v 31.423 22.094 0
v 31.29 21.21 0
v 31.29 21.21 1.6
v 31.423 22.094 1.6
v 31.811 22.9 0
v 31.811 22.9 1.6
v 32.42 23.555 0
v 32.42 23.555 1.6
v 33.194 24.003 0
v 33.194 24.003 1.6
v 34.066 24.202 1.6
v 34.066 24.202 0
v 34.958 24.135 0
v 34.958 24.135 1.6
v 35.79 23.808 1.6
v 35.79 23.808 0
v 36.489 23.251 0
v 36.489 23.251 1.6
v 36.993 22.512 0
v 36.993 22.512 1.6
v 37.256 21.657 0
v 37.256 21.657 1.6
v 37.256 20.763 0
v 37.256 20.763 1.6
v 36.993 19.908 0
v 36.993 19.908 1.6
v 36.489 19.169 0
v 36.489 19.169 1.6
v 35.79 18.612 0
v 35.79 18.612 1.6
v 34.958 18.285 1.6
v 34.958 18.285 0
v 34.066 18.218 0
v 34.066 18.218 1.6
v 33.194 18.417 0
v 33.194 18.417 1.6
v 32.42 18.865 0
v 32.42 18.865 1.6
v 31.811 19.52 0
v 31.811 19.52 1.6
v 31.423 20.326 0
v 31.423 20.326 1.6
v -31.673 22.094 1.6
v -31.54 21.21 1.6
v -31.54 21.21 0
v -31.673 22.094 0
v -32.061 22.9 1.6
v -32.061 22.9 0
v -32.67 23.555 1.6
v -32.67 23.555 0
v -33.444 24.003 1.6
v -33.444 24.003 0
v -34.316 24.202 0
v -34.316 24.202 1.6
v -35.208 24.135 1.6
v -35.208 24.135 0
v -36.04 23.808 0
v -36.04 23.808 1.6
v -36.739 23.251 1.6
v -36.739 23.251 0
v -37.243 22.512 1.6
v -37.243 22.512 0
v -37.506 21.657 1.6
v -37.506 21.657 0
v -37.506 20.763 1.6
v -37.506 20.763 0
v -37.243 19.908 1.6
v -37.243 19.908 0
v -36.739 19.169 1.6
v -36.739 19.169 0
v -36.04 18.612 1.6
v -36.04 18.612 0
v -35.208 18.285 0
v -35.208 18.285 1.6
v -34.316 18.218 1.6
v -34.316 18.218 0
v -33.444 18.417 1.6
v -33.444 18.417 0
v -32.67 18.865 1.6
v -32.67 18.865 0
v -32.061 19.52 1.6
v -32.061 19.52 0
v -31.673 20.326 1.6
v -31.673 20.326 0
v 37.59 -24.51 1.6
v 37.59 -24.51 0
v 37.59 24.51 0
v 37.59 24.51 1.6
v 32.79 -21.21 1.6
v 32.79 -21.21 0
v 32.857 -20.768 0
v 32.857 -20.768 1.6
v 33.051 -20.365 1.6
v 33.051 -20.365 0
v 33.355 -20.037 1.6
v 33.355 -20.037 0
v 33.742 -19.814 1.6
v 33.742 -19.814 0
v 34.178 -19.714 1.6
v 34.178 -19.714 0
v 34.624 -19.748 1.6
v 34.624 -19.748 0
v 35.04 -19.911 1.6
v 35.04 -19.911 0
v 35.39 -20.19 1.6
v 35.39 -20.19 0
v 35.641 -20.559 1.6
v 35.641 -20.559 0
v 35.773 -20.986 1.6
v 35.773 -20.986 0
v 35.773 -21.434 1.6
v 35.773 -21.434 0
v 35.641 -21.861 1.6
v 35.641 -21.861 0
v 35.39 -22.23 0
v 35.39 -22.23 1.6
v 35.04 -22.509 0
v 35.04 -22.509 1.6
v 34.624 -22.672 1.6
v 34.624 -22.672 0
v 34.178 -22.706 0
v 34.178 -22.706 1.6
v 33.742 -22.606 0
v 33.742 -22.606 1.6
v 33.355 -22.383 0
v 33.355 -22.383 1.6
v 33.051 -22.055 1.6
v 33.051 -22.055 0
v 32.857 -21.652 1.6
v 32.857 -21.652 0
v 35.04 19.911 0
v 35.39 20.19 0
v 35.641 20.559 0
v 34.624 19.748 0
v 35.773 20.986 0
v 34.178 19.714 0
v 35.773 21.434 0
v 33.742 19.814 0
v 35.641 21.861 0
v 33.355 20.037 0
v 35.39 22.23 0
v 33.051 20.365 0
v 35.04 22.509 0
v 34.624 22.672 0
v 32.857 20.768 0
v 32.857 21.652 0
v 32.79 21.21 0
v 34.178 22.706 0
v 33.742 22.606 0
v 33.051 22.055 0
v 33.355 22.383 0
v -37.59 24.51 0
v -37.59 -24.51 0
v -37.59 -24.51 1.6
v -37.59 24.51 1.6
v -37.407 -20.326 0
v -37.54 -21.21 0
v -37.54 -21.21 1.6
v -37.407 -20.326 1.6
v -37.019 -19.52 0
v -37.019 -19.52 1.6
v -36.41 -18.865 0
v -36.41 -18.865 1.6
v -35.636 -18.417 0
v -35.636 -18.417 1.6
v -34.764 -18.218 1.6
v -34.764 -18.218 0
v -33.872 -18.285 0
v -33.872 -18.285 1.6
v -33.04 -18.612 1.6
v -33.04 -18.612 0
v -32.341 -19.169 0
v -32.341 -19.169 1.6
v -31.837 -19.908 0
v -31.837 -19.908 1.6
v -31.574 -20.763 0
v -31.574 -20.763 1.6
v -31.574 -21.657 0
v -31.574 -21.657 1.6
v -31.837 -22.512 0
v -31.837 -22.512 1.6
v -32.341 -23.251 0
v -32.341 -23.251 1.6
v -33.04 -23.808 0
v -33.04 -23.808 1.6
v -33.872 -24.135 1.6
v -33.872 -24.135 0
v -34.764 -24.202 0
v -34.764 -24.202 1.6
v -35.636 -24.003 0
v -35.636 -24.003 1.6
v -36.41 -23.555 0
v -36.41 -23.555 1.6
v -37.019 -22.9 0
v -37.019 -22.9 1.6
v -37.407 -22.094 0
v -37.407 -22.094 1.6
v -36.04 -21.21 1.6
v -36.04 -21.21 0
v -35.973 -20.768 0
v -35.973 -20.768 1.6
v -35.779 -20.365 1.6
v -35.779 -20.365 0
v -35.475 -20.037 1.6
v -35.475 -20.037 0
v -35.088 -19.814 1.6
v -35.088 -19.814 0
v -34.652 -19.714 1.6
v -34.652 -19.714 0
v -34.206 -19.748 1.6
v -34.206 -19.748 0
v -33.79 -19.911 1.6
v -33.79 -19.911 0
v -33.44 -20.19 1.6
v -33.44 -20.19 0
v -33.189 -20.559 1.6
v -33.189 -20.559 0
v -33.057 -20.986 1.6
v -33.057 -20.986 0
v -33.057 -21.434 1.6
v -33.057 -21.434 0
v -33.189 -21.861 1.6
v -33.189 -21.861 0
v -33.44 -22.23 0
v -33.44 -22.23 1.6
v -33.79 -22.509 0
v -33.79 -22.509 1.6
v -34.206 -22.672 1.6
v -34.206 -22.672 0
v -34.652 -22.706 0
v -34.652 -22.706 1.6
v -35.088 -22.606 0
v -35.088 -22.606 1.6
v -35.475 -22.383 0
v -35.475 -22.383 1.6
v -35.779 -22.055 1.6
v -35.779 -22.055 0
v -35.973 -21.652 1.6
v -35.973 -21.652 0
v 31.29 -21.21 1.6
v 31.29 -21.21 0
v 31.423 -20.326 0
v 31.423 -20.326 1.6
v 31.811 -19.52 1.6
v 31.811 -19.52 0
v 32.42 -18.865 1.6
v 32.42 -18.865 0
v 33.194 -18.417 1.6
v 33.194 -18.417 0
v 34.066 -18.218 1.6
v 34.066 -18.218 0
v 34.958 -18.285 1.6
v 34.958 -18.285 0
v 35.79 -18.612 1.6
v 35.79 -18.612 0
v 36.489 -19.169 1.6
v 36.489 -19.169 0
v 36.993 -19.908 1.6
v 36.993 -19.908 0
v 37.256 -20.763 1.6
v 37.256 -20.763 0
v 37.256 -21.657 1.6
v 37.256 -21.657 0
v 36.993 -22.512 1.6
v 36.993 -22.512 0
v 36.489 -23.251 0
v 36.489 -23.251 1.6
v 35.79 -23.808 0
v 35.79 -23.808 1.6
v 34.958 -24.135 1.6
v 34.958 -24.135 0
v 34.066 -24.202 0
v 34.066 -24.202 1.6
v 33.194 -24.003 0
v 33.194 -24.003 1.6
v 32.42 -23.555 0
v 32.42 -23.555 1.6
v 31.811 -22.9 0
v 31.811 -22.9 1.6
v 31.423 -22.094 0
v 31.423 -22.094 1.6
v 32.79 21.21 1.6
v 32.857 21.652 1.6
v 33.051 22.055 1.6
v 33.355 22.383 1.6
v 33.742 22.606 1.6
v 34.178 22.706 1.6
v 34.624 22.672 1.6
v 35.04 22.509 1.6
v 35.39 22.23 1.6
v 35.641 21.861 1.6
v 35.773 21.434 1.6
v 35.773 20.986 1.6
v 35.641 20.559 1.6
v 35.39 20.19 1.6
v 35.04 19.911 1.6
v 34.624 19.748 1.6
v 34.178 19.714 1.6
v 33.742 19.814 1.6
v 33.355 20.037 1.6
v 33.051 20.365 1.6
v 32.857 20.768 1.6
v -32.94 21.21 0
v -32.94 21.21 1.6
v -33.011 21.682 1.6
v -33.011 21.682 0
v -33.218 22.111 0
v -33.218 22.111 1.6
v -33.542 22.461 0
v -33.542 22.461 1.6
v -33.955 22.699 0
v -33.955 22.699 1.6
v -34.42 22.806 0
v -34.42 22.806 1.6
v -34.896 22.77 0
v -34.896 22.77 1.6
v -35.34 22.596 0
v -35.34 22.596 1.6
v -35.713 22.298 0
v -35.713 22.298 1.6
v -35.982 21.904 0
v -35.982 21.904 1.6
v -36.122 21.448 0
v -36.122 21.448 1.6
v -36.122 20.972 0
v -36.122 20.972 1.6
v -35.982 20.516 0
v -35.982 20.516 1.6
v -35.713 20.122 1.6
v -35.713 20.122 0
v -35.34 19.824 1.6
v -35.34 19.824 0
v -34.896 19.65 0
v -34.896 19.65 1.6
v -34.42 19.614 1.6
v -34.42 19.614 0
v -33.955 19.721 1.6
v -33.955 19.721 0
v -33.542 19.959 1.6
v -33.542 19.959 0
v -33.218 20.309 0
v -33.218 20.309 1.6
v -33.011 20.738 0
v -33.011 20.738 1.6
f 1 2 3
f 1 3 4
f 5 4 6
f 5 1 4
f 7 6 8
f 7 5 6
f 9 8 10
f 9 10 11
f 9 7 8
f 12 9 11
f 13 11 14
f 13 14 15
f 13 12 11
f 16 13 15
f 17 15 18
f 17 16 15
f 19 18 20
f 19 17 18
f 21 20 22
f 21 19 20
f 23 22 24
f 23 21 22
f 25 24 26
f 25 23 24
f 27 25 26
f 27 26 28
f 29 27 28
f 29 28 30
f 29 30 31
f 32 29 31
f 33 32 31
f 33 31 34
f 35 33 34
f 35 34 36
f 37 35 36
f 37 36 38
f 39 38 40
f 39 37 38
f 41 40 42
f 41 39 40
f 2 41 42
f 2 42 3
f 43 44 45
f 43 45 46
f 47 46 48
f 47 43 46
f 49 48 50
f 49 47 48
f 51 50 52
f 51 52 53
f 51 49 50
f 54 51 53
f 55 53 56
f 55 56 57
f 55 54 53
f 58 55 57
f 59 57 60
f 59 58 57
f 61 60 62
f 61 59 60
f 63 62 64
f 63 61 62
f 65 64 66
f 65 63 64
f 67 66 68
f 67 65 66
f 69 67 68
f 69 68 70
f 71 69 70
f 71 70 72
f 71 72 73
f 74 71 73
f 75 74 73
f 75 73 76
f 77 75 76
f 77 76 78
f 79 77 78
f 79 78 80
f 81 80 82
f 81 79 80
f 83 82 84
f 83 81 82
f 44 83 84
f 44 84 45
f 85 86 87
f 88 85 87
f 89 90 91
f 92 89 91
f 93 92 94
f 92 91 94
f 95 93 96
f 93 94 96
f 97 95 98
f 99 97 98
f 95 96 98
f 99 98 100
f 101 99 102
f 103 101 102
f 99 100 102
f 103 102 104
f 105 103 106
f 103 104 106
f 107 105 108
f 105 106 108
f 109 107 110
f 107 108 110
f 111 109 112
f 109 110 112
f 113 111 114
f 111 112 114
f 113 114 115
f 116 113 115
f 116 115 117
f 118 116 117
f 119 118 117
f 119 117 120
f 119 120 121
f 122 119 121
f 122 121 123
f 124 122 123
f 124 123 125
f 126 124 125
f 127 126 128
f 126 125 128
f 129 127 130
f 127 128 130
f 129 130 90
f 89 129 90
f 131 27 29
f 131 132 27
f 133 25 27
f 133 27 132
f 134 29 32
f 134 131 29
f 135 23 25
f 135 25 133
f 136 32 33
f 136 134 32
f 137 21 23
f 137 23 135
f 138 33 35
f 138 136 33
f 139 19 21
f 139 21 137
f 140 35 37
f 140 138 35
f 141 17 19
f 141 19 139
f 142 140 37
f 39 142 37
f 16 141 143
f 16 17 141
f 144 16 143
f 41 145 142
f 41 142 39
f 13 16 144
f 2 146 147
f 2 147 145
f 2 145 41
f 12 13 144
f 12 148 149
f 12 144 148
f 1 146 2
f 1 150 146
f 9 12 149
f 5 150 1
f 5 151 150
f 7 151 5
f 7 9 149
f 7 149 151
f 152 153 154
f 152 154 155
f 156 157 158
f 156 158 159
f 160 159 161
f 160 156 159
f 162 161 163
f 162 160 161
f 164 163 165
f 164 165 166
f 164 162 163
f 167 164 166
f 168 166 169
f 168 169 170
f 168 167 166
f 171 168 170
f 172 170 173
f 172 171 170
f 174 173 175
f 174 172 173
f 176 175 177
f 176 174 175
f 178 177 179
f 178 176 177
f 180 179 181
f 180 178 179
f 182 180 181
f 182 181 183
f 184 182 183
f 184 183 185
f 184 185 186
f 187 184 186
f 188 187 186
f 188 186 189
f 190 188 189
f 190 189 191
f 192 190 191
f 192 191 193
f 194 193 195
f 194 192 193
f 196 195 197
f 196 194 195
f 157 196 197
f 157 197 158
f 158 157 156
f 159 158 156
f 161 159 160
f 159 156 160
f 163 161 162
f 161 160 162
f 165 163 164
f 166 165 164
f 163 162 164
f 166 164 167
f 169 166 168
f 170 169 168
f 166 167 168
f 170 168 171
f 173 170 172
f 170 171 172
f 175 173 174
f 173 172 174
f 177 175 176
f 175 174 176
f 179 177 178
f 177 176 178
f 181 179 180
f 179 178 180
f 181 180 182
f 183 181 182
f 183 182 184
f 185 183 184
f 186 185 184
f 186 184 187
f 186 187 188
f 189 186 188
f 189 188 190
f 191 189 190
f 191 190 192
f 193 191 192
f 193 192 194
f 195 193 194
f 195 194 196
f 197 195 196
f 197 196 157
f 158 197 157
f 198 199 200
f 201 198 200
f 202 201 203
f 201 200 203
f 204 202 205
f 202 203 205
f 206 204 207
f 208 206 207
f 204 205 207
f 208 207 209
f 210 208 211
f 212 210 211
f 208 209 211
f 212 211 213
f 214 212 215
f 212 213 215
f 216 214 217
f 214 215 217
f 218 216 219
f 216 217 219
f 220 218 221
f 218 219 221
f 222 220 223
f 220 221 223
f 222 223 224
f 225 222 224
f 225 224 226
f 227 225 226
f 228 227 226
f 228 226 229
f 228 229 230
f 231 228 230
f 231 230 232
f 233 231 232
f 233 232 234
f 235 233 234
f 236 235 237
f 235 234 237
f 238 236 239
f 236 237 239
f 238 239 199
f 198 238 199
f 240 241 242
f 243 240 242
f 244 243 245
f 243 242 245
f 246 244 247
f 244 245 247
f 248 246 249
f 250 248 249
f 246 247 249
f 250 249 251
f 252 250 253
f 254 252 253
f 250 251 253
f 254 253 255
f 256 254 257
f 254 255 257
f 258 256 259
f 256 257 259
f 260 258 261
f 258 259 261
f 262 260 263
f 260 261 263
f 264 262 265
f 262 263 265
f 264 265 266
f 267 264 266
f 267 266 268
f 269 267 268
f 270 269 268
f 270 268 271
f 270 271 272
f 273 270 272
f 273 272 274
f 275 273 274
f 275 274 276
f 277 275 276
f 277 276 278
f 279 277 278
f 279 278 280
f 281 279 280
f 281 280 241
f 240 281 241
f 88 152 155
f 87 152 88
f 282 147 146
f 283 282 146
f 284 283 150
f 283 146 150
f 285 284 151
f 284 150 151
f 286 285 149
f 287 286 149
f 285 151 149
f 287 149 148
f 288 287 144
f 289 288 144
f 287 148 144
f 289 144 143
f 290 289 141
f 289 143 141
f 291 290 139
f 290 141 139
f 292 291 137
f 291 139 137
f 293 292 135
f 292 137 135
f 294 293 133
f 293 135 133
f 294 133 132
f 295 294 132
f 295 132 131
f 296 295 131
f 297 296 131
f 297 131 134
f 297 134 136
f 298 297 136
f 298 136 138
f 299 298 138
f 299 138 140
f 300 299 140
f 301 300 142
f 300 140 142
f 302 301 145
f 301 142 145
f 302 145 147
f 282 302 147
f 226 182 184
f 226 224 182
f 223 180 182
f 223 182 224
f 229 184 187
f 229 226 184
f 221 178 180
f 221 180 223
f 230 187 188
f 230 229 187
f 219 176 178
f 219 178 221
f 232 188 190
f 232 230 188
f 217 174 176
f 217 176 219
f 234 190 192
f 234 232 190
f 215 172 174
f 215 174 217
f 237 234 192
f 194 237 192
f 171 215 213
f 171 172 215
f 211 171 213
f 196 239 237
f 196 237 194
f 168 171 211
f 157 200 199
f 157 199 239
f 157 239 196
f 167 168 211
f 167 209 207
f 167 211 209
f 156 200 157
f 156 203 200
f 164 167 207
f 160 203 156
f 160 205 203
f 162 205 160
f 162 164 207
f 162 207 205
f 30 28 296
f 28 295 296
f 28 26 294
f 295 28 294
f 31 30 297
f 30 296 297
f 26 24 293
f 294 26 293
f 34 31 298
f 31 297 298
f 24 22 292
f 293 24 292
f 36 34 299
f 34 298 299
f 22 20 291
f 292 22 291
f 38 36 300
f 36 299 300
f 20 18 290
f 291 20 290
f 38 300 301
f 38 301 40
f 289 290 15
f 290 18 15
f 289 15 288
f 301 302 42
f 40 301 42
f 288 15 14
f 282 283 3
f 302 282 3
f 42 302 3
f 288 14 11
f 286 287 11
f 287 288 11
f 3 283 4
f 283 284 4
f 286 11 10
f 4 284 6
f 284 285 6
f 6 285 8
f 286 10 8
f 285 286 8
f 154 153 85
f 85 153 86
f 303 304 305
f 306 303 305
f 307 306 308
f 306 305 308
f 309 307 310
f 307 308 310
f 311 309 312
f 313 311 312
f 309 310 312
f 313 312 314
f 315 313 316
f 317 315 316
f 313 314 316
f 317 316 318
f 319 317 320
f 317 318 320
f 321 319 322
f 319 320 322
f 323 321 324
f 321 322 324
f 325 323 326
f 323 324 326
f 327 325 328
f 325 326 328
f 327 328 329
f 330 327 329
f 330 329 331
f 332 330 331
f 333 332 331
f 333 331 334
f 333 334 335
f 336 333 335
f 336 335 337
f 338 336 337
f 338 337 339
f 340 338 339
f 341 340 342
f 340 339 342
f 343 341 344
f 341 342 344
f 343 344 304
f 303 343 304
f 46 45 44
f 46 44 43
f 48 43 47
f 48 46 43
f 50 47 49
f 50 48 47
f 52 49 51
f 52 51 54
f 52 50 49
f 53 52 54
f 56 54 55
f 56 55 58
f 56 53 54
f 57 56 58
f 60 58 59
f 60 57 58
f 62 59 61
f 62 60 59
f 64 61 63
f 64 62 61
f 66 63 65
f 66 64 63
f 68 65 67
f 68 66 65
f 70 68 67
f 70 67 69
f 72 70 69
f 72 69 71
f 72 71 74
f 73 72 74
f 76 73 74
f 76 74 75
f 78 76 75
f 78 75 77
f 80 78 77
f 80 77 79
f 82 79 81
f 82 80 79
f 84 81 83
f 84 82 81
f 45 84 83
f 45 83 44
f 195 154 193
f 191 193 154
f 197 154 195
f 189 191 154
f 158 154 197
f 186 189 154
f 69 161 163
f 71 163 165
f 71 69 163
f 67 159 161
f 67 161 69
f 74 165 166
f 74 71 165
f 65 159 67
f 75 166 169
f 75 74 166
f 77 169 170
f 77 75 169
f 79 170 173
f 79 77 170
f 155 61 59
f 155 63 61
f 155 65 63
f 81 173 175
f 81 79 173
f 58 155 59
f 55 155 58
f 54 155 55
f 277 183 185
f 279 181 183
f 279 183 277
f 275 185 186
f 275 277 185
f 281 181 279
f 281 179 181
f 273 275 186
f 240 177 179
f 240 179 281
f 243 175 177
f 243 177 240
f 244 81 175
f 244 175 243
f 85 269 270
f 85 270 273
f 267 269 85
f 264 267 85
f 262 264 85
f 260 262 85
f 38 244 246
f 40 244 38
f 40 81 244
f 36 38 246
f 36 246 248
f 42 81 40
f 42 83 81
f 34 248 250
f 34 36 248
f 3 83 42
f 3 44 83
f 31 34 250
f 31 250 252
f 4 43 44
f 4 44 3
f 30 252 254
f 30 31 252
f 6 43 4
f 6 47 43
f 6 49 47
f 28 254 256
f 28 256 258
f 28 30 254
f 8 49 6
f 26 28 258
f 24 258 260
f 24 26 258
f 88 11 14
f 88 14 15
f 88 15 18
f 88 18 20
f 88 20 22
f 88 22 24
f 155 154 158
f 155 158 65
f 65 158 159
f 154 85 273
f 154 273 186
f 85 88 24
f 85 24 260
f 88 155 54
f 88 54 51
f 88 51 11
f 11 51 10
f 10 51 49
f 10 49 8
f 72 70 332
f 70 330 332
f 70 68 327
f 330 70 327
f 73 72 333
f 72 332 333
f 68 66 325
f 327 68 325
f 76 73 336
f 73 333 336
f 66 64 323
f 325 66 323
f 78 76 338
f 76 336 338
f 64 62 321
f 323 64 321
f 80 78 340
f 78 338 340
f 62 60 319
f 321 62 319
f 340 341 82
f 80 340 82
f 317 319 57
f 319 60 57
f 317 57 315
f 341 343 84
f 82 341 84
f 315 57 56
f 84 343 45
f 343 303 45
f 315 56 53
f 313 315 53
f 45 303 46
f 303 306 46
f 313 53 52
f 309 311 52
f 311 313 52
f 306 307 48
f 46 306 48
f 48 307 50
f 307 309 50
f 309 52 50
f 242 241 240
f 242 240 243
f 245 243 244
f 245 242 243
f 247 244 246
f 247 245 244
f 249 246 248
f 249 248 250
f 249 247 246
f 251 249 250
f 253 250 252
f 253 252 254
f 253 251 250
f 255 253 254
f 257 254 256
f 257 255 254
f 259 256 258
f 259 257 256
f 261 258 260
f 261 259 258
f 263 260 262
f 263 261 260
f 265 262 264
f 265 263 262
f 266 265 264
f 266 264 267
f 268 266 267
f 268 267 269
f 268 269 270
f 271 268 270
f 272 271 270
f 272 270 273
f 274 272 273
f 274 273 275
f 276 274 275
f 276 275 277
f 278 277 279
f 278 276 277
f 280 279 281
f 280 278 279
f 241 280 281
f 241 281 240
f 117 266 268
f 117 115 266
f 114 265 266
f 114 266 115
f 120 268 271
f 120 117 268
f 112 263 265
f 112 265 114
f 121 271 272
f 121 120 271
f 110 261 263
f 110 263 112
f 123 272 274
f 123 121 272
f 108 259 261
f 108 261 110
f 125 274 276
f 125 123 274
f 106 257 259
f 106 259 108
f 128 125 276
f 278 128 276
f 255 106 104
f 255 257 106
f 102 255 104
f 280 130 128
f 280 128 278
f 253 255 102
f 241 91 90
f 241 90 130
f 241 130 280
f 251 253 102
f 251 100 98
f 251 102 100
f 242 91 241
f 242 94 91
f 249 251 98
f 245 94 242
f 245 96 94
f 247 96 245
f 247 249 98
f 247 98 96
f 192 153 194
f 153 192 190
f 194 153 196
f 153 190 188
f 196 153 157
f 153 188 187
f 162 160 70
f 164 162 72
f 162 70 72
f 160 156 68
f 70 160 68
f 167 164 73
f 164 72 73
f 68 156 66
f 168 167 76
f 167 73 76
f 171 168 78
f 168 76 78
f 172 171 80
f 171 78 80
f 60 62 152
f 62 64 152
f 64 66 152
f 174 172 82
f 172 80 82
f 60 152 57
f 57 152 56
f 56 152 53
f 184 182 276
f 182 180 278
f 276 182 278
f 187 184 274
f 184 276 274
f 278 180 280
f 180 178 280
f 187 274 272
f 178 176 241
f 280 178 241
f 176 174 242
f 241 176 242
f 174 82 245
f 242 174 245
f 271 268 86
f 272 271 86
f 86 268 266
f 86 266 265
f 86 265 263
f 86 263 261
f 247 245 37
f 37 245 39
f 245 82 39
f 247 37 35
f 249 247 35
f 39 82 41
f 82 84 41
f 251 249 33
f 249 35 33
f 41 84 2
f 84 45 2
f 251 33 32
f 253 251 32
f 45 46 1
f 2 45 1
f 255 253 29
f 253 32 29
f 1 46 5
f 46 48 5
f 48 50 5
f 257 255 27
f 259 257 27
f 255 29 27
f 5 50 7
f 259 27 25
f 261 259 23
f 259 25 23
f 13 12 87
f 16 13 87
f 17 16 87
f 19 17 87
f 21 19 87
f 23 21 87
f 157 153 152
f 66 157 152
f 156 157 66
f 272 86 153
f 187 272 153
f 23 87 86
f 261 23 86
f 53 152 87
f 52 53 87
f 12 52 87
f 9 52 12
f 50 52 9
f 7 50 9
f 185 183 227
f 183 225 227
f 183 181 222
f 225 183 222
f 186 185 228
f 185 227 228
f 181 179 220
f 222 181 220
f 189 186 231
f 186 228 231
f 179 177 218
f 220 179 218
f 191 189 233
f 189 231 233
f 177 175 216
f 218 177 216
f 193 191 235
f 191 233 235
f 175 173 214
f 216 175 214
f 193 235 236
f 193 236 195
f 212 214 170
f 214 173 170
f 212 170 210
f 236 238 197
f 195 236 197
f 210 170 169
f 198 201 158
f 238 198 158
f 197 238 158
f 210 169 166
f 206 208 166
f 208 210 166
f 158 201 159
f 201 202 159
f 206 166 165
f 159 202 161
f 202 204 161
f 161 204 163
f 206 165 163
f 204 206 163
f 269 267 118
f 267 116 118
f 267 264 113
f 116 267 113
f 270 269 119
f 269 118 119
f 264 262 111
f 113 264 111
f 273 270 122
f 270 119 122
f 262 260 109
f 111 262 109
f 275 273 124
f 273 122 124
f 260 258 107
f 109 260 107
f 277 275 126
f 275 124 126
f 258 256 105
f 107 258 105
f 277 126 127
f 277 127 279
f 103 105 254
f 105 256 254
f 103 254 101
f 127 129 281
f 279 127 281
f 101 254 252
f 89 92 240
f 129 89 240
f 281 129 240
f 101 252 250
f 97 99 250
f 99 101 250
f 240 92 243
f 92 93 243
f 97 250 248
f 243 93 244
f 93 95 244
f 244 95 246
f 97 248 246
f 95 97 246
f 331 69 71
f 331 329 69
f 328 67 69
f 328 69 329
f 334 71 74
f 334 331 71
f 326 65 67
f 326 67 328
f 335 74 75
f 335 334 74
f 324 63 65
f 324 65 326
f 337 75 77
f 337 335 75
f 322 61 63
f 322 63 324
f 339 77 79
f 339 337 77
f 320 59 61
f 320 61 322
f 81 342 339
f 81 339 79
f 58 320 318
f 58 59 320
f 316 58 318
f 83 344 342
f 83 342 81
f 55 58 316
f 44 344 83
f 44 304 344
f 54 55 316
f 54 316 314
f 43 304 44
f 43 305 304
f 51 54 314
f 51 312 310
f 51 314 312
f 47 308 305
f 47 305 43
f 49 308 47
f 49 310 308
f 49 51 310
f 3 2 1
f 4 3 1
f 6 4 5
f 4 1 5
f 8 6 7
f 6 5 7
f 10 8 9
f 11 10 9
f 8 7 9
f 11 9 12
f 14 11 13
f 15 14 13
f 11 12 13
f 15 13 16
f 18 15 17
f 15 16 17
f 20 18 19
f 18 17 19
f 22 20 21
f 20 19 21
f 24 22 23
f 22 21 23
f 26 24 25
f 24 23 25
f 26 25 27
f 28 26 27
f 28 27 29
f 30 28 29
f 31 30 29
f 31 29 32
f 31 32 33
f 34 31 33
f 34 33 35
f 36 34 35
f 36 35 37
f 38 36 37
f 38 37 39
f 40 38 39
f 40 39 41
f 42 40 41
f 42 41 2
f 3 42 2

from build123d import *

# Parameters (mm, degrees)
CUT_EXTRUDE1_START       = -1.6002
CUT_EXTRUDE1_OUTLINE_W   = 75.18
CUT_EXTRUDE1_OUTLINE_H   = 49.02
CUT_EXTRUDE1_OUTLINE_R   = 1.6
CUT_EXTRUDE1_OUTLINE_R_2 = 3
CUT_EXTRUDE1_DEPTH       = 1.6002
SKETCH3_R                = 3
SKETCH3_R_2              = 1.6
BOSS_EXTRUDE2_DEPTH      = 1.6002
SKETCH4_R                = 3
CUT_EXTRUDE2_DEPTH       = 45.903327717
SKETCH7_R                = 3
SKETCH7_R_2              = 1.5
BOSS_EXTRUDE4_DEPTH      = 1.6002
SKETCH8_R                = 3
SKETCH8_R_2              = 1.5
BOSS_EXTRUDE5_DEPTH      = 1.6002
SKETCH9_R                = 3
SKETCH9_R_2              = 1.5
BOSS_EXTRUDE6_DEPTH      = 1.6002


with BuildPart() as part:
    # Cut-Extrude1: read off the stored shape, not the designer's step
    # Cut-Extrude1 outline → Cut-Extrude1 (new body)
    with BuildSketch(Plane.XY.offset(1.6002).offset(CUT_EXTRUDE1_START)):
        Rectangle(CUT_EXTRUDE1_OUTLINE_W, CUT_EXTRUDE1_OUTLINE_H)
        with Locations((-34.54, -21.21)):
            Circle(CUT_EXTRUDE1_OUTLINE_R, mode=Mode.SUBTRACT)
        with Locations((34.29, -21.21)):
            Circle(CUT_EXTRUDE1_OUTLINE_R, mode=Mode.SUBTRACT)
        with Locations((-34.54, 21.21)):
            Circle(CUT_EXTRUDE1_OUTLINE_R_2, mode=Mode.SUBTRACT)
        with Locations((34.29, 21.21)):
            Circle(CUT_EXTRUDE1_OUTLINE_R, mode=Mode.SUBTRACT)
    extrude(amount=CUT_EXTRUDE1_DEPTH)

    # Sketch4 → Cut-Extrude2 (cut, through all)
    with BuildSketch(Plane(origin=(0, 0, 0), x_dir=(-1, 0, 0), z_dir=(0, 0, -1))):
        with Locations((34.54, -21.21)):
            Circle(SKETCH4_R)
        with Locations((-34.29, -21.21)):
            Circle(SKETCH4_R)
        with Locations((-34.29, 21.21)):
            Circle(SKETCH4_R)
    extrude(amount=-CUT_EXTRUDE2_DEPTH, mode=Mode.SUBTRACT)


with BuildPart() as body_2:
    # Sketch3 → Boss-Extrude2 (new body)
    with BuildSketch(Plane.XY.offset(1.6002)):
        with Locations((-34.54, 21.21)):
            Circle(SKETCH3_R)
        with Locations((-34.54, 21.21)):
            Circle(SKETCH3_R_2, mode=Mode.SUBTRACT)
    extrude(amount=-BOSS_EXTRUDE2_DEPTH)


with BuildPart() as body_3:
    # Sketch7 → Boss-Extrude4 (new body)
    with BuildSketch(Plane(origin=(0, 0, 0), x_dir=(-1, 0, 0), z_dir=(0, 0, -1))):
        with Locations((-34.29, 21.21)):
            Circle(SKETCH7_R)
        with Locations((-34.29, 21.21)):
            Circle(SKETCH7_R_2, mode=Mode.SUBTRACT)
    extrude(amount=-BOSS_EXTRUDE4_DEPTH)


with BuildPart() as body_4:
    # Sketch8 → Boss-Extrude5 (new body)
    with BuildSketch(Plane(origin=(0, 0, 0), x_dir=(-1, 0, 0), z_dir=(0, 0, -1))):
        with Locations((-34.29, -21.21)):
            Circle(SKETCH8_R)
        with Locations((-34.29, -21.21)):
            Circle(SKETCH8_R_2, mode=Mode.SUBTRACT)
    extrude(amount=-BOSS_EXTRUDE5_DEPTH)


with BuildPart() as body_5:
    # Sketch9 → Boss-Extrude6 (new body)
    with BuildSketch(Plane(origin=(0, 0, 0), x_dir=(-1, 0, 0), z_dir=(0, 0, -1))):
        with Locations((34.54, -21.21)):
            Circle(SKETCH9_R)
        with Locations((34.54, -21.21)):
            Circle(SKETCH9_R_2, mode=Mode.SUBTRACT)
    extrude(amount=-BOSS_EXTRUDE6_DEPTH)


solid = Compound([part.part, body_2.part, body_3.part, body_4.part, body_5.part])
